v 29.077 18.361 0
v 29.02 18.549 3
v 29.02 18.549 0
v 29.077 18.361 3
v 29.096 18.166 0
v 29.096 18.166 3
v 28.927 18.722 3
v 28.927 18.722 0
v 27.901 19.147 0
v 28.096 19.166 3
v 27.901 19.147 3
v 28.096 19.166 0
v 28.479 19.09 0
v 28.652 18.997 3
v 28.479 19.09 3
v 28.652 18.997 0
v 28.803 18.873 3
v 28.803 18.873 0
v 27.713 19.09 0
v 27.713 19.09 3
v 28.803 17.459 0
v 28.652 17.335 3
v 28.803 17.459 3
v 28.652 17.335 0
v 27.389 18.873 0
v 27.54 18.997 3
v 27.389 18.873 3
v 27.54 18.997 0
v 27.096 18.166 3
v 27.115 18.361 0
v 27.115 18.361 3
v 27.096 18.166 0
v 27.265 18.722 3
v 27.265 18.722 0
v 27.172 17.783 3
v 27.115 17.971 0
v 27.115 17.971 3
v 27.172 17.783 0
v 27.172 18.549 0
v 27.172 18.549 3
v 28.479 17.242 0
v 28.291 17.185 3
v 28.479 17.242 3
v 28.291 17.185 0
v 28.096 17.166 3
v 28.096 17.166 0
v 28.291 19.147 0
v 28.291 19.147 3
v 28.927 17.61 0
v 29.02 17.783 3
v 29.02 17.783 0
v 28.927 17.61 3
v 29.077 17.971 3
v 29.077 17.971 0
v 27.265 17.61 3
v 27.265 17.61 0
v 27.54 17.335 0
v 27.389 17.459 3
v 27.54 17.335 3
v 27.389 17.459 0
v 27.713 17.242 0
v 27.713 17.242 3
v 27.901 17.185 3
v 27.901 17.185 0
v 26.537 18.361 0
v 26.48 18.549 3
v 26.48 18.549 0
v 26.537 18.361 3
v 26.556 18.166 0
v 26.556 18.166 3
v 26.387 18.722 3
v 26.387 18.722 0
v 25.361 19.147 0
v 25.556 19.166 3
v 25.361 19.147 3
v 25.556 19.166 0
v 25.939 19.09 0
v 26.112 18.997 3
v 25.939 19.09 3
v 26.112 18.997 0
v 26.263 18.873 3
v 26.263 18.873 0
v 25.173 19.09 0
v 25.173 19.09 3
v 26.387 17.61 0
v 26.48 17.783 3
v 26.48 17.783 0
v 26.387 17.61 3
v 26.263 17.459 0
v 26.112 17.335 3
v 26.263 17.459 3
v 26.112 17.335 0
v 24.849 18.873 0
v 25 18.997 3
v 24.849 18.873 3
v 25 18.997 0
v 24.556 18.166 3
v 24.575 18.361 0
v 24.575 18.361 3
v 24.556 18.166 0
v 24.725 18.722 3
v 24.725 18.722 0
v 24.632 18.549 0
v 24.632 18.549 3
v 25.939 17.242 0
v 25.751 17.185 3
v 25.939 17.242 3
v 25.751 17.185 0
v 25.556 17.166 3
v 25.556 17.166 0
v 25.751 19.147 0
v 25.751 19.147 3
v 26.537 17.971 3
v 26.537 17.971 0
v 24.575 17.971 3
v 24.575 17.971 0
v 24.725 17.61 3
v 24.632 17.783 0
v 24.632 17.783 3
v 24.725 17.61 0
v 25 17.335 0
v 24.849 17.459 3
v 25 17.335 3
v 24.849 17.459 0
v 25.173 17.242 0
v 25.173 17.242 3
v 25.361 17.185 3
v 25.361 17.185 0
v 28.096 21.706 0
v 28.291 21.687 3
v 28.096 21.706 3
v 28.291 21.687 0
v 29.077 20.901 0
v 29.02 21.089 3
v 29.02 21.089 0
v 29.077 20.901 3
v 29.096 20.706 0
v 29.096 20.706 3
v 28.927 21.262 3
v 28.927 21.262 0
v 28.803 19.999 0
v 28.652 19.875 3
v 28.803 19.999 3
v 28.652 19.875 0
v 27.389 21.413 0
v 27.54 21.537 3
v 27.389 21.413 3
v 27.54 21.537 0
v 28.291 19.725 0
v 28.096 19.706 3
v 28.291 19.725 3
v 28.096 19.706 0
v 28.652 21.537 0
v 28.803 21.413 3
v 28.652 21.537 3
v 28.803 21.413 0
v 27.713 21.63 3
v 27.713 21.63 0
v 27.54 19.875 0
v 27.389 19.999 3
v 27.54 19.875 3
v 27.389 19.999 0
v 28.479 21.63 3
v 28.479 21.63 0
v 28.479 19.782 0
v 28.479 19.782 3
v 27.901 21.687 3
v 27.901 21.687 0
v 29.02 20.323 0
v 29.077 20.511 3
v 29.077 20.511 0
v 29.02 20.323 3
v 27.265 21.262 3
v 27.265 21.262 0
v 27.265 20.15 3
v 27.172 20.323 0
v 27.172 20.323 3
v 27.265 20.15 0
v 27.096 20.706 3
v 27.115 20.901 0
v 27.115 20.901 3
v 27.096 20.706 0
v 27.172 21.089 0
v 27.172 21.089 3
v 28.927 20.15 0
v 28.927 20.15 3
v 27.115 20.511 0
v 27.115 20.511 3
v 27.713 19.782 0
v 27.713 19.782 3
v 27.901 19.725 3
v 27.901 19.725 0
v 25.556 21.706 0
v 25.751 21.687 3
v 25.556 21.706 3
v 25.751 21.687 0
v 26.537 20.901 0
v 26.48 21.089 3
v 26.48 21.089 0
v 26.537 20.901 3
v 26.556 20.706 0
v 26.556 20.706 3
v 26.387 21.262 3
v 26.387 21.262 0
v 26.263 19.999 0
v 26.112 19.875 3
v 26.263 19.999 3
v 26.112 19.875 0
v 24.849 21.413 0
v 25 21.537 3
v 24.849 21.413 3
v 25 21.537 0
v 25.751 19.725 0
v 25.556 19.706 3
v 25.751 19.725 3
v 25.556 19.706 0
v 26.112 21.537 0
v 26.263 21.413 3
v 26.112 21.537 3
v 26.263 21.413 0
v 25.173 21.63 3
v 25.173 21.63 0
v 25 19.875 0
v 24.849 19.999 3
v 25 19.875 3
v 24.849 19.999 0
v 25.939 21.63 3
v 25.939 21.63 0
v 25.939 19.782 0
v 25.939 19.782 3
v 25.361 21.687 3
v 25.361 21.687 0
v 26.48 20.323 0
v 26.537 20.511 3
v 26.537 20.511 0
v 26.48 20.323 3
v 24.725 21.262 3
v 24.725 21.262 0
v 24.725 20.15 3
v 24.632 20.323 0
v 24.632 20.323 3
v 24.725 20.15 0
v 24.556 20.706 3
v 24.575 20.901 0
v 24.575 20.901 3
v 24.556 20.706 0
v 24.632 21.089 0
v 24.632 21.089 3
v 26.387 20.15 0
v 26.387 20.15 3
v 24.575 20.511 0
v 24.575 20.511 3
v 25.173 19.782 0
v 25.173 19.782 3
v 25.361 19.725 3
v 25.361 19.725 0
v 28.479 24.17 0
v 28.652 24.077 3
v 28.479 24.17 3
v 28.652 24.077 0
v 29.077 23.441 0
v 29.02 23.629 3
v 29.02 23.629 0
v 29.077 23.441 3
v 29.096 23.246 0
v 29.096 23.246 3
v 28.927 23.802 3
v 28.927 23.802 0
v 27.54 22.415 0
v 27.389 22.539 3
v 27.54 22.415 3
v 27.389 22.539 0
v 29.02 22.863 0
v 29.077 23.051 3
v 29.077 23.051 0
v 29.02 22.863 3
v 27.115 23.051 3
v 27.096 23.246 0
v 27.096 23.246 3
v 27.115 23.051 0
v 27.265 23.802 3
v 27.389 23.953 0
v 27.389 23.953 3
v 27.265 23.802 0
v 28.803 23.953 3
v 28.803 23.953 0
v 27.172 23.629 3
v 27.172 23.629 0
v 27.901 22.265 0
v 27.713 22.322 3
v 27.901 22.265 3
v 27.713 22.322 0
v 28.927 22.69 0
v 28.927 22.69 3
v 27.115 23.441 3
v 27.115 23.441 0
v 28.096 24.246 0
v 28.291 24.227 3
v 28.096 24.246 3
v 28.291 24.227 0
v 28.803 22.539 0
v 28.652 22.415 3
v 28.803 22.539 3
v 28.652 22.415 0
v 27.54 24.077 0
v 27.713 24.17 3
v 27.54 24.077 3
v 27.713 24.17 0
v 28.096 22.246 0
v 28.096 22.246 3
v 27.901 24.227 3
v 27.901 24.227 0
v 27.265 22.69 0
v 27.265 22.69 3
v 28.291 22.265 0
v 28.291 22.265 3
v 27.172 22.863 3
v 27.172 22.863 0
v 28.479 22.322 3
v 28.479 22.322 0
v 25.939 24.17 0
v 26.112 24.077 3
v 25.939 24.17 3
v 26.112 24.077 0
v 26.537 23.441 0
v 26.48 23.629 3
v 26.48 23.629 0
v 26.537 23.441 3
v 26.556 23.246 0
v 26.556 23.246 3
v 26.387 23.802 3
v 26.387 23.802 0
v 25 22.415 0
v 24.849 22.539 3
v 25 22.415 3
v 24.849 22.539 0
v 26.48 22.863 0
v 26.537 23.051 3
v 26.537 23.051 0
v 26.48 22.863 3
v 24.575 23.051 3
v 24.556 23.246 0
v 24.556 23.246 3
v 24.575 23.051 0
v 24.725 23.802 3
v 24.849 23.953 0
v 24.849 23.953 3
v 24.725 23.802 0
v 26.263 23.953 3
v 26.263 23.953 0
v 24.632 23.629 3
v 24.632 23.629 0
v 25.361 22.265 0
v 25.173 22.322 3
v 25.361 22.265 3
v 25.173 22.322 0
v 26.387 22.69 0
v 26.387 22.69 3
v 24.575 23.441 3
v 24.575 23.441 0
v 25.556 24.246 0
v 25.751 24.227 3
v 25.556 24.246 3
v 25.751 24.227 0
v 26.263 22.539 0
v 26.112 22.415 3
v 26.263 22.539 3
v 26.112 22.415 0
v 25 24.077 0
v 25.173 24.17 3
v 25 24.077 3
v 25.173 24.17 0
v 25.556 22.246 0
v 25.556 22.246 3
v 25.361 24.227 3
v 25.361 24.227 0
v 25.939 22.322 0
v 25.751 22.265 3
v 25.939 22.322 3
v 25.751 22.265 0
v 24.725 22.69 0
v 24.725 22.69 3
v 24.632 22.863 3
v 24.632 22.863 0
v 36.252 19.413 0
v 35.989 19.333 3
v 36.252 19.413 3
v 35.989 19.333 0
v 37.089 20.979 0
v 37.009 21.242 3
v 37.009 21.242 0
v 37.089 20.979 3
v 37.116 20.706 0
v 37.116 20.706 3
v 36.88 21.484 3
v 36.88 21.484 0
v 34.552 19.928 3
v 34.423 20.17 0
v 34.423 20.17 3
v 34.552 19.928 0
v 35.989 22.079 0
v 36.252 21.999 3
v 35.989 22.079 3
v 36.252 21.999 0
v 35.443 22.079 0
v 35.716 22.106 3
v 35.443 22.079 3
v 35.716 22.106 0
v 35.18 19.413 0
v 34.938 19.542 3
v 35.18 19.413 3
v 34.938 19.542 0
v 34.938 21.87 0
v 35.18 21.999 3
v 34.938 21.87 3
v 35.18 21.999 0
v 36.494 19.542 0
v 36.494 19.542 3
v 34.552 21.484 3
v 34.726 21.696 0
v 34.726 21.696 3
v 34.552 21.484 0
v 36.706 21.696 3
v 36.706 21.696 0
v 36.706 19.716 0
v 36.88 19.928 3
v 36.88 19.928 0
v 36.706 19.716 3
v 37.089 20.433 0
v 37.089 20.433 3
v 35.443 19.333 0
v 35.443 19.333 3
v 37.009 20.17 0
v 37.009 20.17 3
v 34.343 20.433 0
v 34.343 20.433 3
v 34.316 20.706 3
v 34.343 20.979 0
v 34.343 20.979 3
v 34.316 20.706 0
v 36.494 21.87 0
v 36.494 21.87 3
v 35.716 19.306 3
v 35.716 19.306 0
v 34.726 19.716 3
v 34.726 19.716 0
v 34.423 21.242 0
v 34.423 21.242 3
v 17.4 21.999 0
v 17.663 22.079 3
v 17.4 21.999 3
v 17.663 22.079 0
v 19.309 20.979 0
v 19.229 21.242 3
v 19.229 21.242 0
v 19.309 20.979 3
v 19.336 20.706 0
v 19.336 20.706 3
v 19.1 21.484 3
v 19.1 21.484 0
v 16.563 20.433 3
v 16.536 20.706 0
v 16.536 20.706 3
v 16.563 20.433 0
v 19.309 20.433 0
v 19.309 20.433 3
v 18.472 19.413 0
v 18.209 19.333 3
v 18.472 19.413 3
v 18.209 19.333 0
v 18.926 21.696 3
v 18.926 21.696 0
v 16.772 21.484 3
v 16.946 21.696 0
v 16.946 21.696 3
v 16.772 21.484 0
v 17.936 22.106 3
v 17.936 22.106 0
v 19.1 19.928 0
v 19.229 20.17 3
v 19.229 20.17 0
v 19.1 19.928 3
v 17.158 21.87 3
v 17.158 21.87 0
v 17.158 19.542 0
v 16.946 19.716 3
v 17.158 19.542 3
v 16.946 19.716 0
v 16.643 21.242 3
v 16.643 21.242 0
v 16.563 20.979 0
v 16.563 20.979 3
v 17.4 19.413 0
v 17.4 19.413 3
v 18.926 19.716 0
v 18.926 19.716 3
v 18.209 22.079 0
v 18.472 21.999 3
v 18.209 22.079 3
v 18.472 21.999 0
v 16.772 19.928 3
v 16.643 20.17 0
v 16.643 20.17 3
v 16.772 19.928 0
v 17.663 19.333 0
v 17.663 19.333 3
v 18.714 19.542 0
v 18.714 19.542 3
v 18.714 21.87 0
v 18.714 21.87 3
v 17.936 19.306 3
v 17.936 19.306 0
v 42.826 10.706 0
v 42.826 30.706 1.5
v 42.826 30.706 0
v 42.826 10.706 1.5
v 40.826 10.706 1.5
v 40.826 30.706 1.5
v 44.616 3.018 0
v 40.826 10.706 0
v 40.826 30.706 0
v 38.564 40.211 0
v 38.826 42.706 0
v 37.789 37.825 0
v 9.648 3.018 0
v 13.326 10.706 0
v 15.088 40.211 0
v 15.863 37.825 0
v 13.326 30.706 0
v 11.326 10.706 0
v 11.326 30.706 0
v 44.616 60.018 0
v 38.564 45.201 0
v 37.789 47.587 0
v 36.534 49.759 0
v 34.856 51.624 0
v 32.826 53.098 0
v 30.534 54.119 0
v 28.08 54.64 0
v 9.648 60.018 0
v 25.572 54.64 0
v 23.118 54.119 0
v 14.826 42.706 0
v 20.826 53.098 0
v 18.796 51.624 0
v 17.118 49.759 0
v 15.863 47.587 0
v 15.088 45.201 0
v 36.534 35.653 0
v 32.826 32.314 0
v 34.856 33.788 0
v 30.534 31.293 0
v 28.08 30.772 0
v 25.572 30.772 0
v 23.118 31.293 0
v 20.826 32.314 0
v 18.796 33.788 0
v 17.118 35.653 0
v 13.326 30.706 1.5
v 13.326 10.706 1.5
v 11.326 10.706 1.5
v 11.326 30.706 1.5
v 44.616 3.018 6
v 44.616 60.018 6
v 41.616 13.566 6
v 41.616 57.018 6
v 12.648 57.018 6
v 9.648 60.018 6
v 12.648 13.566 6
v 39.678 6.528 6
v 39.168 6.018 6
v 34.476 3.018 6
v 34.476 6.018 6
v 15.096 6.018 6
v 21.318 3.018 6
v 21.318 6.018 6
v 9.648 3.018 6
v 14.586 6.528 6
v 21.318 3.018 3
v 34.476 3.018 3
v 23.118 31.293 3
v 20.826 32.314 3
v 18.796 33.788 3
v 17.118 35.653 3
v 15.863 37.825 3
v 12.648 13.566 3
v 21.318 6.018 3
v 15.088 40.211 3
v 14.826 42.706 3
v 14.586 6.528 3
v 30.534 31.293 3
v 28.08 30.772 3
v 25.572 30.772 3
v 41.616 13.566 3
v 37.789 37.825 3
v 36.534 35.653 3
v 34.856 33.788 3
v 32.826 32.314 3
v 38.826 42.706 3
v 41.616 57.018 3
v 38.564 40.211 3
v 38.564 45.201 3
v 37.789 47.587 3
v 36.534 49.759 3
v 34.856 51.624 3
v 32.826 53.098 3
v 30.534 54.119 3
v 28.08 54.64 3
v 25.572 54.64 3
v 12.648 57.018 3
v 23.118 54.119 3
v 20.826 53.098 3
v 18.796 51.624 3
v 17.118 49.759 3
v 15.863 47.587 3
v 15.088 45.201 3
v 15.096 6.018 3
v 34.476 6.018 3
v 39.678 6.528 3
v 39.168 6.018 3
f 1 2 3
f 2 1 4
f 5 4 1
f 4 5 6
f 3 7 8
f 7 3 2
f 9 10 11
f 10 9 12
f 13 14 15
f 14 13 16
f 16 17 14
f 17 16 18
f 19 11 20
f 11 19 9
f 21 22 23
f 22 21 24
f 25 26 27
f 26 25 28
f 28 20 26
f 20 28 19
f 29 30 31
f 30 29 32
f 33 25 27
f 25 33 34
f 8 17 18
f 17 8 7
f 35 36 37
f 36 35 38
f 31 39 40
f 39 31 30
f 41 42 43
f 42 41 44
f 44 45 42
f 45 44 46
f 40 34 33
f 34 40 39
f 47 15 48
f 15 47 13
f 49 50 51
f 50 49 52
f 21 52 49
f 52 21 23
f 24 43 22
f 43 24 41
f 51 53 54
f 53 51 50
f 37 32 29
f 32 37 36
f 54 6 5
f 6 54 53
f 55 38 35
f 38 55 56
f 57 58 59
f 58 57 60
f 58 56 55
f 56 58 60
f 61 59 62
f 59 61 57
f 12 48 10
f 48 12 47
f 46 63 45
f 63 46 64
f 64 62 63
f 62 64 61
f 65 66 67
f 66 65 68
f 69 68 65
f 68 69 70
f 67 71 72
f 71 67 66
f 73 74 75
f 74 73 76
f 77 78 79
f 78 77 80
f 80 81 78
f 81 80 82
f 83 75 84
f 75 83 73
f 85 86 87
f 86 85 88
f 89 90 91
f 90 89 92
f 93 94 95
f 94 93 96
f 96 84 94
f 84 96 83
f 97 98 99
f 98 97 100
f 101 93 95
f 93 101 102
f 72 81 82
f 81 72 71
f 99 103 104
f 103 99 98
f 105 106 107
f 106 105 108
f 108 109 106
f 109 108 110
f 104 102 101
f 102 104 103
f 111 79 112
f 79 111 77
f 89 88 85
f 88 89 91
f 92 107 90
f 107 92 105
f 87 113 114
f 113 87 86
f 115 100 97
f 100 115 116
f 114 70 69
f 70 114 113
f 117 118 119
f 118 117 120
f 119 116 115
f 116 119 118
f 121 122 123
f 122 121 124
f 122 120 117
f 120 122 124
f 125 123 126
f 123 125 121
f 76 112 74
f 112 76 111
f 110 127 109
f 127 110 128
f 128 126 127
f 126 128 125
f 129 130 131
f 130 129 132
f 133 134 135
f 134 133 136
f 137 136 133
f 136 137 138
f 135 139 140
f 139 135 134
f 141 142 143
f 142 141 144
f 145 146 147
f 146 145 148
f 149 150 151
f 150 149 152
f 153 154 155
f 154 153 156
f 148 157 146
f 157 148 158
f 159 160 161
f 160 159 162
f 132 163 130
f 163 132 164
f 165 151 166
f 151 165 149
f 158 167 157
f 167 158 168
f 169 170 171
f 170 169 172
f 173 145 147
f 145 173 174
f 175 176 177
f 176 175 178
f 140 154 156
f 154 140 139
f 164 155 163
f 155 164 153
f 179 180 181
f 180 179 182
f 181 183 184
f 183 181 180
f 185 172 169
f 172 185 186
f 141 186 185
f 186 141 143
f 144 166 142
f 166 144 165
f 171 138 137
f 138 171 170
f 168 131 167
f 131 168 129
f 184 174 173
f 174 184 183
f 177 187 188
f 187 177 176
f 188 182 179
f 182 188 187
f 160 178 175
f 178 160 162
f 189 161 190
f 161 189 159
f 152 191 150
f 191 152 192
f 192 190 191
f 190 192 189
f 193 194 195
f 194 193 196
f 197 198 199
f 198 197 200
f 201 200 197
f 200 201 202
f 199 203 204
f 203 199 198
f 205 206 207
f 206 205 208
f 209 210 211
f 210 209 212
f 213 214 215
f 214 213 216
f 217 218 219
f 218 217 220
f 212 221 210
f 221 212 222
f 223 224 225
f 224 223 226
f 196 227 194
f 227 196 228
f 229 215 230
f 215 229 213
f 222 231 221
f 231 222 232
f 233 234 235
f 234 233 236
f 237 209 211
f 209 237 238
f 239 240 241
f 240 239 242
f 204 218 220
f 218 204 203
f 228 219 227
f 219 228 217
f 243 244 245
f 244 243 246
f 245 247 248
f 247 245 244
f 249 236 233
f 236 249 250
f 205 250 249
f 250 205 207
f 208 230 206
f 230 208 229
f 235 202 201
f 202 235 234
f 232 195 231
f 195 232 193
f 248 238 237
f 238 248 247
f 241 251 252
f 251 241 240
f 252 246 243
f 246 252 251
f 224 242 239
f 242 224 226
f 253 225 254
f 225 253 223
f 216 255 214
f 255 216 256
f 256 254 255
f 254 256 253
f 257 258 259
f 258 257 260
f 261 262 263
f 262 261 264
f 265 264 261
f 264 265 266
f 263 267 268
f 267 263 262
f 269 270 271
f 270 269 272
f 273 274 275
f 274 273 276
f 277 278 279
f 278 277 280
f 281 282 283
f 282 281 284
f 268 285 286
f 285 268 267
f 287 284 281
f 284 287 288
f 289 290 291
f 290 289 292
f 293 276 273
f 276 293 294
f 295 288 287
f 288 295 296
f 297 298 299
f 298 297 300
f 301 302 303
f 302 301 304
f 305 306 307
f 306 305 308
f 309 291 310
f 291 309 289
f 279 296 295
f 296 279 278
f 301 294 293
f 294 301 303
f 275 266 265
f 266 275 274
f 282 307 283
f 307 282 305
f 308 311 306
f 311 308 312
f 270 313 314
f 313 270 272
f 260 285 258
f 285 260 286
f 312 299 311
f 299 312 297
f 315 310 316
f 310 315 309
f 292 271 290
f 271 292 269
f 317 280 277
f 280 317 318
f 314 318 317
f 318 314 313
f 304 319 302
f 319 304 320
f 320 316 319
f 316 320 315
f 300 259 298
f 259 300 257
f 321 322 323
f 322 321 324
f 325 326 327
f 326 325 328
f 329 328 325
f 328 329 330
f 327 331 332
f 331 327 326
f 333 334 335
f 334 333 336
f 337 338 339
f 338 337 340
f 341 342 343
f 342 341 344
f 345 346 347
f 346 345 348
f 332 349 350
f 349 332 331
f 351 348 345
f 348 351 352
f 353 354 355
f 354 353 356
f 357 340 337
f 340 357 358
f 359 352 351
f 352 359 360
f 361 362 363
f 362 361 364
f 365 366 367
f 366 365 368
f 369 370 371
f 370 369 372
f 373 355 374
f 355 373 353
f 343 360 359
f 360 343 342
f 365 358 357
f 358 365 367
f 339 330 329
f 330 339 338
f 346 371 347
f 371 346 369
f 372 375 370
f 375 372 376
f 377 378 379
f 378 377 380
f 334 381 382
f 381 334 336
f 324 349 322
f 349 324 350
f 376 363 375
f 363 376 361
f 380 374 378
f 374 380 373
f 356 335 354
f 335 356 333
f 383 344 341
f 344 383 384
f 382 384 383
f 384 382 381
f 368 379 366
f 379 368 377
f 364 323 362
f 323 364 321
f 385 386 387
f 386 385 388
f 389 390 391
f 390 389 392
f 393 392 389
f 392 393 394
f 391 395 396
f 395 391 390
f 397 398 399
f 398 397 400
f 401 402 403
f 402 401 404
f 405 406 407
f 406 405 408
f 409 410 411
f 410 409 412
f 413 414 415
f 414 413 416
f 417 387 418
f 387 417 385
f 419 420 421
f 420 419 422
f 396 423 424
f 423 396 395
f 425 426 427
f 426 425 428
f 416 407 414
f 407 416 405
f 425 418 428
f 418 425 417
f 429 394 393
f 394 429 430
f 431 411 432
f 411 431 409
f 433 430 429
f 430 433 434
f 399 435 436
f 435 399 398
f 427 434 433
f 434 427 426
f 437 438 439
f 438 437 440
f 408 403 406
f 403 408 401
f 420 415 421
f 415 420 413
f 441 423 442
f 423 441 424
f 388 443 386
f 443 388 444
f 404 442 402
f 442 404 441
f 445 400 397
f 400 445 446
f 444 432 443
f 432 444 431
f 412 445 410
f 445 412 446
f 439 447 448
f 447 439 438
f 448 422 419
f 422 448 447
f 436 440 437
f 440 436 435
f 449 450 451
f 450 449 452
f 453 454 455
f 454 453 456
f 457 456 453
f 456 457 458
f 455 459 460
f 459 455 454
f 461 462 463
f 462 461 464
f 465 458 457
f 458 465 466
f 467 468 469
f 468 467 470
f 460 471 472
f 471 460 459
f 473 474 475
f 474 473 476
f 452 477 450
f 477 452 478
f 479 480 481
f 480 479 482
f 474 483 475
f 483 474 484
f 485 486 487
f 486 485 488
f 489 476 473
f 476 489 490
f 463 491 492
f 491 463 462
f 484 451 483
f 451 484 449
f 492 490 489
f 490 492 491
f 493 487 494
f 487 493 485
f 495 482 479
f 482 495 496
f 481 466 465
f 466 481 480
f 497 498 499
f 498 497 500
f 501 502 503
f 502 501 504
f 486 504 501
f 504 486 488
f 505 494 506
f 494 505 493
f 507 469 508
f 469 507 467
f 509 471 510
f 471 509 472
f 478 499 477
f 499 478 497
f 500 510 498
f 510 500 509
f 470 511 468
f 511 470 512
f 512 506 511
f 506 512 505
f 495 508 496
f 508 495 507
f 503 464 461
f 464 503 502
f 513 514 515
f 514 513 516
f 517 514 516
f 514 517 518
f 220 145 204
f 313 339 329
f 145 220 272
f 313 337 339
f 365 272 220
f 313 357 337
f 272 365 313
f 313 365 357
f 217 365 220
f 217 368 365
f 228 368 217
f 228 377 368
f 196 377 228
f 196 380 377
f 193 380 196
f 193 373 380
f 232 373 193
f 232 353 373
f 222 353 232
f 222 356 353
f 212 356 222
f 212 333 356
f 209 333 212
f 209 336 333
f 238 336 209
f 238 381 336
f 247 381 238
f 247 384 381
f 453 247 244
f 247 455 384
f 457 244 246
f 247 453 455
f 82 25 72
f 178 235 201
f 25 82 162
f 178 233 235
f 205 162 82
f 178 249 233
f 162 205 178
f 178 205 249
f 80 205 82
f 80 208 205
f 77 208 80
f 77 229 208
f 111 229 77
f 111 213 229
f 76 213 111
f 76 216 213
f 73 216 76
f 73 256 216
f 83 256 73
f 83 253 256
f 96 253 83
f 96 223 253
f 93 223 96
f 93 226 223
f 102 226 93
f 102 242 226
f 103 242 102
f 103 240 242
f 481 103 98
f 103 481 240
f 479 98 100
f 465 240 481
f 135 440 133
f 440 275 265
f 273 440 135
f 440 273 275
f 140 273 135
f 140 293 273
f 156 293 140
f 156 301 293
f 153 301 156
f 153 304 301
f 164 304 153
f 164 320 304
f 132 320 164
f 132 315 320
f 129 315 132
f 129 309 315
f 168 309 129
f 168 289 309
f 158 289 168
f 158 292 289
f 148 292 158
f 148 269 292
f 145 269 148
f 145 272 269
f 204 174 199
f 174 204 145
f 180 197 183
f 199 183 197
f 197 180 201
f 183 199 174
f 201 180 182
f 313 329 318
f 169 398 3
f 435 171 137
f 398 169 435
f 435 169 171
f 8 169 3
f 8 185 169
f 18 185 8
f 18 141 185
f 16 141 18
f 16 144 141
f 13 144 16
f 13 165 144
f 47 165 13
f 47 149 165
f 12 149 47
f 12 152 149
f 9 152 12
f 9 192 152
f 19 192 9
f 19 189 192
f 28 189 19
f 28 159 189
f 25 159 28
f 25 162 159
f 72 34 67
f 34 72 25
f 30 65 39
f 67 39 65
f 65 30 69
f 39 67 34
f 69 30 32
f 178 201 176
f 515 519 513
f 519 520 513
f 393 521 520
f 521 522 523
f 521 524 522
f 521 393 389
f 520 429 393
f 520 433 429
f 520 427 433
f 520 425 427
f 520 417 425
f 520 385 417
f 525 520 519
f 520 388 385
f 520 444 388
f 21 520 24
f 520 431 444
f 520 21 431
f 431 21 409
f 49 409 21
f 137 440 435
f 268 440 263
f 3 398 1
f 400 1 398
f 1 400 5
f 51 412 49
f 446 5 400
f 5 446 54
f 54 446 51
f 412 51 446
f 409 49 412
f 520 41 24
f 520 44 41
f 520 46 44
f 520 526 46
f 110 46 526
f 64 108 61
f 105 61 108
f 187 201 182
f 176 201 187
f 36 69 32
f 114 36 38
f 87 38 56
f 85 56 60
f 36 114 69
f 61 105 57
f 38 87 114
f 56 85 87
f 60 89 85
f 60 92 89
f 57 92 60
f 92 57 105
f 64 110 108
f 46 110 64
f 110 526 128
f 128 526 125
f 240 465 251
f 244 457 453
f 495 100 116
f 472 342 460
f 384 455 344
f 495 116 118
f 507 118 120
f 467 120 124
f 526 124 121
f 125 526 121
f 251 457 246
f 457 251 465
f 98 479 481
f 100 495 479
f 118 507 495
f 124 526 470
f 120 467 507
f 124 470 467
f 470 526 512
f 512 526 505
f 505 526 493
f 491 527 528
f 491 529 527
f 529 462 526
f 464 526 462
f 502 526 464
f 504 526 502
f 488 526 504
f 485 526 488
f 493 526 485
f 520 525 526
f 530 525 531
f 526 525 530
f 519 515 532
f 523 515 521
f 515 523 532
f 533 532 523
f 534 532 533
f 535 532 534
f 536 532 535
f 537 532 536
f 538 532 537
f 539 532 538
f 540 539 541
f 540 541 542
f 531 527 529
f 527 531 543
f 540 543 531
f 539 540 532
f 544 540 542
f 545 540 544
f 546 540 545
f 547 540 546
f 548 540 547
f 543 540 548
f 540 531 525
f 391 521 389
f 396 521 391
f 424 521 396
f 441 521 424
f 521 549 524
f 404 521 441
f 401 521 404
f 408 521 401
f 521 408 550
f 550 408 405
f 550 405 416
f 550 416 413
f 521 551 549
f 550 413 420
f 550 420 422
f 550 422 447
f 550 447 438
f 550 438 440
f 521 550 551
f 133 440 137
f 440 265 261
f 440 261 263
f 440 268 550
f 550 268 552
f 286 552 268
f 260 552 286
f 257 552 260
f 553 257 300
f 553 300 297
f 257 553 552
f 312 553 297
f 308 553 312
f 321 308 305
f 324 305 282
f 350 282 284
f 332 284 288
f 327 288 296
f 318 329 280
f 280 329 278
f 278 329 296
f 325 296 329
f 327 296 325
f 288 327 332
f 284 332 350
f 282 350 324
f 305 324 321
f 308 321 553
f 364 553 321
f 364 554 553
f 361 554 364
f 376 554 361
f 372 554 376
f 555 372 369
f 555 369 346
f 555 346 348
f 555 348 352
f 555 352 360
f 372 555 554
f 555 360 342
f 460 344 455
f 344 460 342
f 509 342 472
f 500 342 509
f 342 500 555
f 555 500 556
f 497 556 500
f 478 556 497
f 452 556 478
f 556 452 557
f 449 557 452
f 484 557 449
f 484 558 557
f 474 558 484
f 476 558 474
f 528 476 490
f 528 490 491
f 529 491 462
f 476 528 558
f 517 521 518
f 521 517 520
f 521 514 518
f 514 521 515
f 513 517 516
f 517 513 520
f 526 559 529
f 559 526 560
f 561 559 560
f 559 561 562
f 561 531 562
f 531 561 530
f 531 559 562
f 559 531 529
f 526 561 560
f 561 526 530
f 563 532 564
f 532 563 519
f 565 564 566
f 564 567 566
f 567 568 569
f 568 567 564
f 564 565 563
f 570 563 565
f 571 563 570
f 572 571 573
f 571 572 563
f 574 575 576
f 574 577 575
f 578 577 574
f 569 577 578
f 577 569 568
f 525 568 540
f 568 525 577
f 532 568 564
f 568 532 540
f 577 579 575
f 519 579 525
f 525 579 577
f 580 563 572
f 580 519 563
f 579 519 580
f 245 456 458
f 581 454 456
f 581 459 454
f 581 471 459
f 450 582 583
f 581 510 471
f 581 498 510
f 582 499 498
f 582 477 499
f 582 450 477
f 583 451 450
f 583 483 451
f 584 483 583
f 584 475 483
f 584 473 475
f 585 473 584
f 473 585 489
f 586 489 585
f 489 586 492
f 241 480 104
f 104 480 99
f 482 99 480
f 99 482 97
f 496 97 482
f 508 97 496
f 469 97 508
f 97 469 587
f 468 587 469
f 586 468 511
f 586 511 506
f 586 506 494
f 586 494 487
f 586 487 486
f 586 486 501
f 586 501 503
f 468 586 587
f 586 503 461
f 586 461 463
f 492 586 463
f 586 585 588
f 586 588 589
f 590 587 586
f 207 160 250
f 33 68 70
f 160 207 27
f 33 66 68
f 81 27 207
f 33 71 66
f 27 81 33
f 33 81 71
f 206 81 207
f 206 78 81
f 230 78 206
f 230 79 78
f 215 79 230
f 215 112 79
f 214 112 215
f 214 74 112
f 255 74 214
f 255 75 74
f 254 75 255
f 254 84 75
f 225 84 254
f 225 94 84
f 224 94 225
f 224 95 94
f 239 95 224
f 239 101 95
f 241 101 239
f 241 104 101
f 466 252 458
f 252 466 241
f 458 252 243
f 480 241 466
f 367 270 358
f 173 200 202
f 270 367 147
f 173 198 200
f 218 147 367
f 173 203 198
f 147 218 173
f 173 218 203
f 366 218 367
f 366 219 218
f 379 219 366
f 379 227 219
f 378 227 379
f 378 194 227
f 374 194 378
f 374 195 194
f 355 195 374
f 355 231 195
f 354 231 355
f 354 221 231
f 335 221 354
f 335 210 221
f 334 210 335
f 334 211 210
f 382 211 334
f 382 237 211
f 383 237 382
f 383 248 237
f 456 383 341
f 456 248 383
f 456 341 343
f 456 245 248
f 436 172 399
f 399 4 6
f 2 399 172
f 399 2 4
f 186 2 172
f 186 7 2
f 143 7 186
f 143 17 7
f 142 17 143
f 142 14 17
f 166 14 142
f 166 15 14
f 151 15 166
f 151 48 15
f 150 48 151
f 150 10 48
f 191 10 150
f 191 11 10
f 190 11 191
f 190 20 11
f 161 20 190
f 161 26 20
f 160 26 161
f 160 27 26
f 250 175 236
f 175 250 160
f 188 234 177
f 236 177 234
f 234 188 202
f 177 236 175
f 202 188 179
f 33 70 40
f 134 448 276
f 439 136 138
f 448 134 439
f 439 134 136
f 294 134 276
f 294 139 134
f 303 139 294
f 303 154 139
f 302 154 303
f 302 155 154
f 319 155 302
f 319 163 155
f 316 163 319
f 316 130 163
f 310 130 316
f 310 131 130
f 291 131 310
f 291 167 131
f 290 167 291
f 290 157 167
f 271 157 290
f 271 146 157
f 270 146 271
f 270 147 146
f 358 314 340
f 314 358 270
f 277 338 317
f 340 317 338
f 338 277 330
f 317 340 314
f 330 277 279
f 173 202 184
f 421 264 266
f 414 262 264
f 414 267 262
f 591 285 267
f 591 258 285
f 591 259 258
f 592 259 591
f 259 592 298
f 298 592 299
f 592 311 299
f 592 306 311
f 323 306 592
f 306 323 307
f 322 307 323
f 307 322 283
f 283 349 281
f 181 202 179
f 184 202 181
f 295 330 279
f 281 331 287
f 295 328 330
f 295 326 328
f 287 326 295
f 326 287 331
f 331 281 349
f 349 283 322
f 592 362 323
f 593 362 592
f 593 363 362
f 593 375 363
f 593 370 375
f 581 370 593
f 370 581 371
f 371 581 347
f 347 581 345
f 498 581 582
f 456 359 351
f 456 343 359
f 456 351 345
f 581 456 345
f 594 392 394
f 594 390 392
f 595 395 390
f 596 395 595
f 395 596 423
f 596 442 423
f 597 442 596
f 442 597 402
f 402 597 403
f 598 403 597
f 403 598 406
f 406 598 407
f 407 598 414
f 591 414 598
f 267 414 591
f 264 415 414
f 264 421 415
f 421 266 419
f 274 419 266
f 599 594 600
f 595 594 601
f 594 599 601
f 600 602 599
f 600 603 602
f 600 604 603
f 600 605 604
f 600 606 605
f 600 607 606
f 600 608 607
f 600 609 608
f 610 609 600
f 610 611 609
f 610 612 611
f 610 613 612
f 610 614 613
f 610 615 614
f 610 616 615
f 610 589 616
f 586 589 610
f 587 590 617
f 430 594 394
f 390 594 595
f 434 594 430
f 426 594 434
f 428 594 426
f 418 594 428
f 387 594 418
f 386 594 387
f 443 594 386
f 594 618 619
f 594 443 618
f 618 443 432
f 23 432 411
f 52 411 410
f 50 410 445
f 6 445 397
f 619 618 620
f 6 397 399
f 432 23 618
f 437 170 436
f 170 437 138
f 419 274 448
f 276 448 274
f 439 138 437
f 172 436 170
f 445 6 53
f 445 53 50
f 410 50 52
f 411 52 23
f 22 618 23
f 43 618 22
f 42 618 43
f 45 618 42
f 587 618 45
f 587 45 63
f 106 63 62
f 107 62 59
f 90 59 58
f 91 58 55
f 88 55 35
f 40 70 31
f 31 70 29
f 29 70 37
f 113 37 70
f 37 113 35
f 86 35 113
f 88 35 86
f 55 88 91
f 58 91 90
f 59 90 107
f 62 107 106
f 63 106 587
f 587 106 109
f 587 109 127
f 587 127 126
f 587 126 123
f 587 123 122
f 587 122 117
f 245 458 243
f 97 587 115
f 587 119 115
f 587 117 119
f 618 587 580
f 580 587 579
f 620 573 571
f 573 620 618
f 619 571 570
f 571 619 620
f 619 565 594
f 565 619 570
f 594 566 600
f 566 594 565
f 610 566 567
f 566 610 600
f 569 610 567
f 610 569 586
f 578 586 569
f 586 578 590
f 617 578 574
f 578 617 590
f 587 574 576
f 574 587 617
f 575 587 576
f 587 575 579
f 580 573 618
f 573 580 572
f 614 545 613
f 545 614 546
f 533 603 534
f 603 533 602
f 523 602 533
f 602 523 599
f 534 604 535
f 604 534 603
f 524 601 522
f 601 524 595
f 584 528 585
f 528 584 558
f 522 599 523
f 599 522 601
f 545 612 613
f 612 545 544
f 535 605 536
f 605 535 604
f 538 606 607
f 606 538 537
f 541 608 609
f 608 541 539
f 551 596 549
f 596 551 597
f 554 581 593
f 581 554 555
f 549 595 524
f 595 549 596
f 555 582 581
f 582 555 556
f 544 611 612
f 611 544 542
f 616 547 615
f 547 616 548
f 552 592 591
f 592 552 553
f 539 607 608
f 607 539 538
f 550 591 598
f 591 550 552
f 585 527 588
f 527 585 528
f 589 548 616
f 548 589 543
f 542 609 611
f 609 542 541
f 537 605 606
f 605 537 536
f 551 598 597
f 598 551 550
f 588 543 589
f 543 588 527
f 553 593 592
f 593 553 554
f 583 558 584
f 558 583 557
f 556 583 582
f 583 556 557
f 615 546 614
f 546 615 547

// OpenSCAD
module pcb(scale = 1)
{
    scale([scale, scale, 1])
    {
        linear_extrude(height = 7)
           import(file = "tweety.dxf");
//        translate([26.3, 20.3, -20])
//            cylinder(r=0.1, h=30);   
    }
}

module isp(v)
{
    translate(v)
    {
        for(i=[-2.54:2.54:2.54])
        {
            translate([1.27,i,-10])
                cylinder(r=1, h=30, $fn=32);
            translate([-1.27,i,-10])
                cylinder(r=1, h=30, $fn=32);
        }
        
        
        translate([1.27 + 2.54*3, 0, -10])
            cylinder(r=2.8/2, h=30, $fn=32);

        translate([-1.27 - 2.54*3, 0, -10])
            cylinder(r=2.8/2, h=30, $fn=32);
    }
}

module clamp_mark(v)
{
    translate(v)
    {
        translate([14,-10,0])
            cube([2,20,1.5]);
        translate([-14-1.5,-10,0])
            cube([2,20,1.5]);        
    }
}

pcb_scale= 1.02;
isp_x = 26.3*pcb_scale;
isp_y = 20.3*pcb_scale;

module top()
{
    difference()
    {
        translate([12.4*pcb_scale-3, 5.9*pcb_scale-3, 0])
        cube([28.4*pcb_scale+2*3,50*pcb_scale+2*3, 6]);

        translate([0,0,3])
           pcb(pcb_scale);

        isp([isp_x, isp_y, 0]);
        clamp_mark([isp_x, isp_y, 0]);
        
        translate([isp_x, isp_y+22, 0])
            cylinder(r=12, h=10);
    }
}

module isp_support(v)
{
    translate(v)
    {
        difference()
        {
            translate([-24/2, -20/2, -9])
                cube([24, 20, 9]);
            isp();
        }
    }
}

module isp_support2(v)
{
    translate(v)
    {
        difference()
        {
            translate([-24/2, -20/2, 0])
                cube([24, 20, 15+1.8]);
 
            isp();           
            translate([-22/2, -13/2, 15])
                cube([22, 13, 1.8]);       
            translate([-6/2, -10/2, 0])
                cube([6, 10, 15+1.8]);
            
            translate([1.27 + 2.54*3, 0, -10])
                cylinder(r=3/2, h=30, $fn=32);

            translate([-1.27 - 2.54*3, 0, -10])
                cylinder(r=3/2, h=30, $fn=32);
        }
    }
}


top();
//isp_support([isp_x, isp_y, 0]);
//isp_support2([isp_x, isp_y, -15-9-1.8]);
